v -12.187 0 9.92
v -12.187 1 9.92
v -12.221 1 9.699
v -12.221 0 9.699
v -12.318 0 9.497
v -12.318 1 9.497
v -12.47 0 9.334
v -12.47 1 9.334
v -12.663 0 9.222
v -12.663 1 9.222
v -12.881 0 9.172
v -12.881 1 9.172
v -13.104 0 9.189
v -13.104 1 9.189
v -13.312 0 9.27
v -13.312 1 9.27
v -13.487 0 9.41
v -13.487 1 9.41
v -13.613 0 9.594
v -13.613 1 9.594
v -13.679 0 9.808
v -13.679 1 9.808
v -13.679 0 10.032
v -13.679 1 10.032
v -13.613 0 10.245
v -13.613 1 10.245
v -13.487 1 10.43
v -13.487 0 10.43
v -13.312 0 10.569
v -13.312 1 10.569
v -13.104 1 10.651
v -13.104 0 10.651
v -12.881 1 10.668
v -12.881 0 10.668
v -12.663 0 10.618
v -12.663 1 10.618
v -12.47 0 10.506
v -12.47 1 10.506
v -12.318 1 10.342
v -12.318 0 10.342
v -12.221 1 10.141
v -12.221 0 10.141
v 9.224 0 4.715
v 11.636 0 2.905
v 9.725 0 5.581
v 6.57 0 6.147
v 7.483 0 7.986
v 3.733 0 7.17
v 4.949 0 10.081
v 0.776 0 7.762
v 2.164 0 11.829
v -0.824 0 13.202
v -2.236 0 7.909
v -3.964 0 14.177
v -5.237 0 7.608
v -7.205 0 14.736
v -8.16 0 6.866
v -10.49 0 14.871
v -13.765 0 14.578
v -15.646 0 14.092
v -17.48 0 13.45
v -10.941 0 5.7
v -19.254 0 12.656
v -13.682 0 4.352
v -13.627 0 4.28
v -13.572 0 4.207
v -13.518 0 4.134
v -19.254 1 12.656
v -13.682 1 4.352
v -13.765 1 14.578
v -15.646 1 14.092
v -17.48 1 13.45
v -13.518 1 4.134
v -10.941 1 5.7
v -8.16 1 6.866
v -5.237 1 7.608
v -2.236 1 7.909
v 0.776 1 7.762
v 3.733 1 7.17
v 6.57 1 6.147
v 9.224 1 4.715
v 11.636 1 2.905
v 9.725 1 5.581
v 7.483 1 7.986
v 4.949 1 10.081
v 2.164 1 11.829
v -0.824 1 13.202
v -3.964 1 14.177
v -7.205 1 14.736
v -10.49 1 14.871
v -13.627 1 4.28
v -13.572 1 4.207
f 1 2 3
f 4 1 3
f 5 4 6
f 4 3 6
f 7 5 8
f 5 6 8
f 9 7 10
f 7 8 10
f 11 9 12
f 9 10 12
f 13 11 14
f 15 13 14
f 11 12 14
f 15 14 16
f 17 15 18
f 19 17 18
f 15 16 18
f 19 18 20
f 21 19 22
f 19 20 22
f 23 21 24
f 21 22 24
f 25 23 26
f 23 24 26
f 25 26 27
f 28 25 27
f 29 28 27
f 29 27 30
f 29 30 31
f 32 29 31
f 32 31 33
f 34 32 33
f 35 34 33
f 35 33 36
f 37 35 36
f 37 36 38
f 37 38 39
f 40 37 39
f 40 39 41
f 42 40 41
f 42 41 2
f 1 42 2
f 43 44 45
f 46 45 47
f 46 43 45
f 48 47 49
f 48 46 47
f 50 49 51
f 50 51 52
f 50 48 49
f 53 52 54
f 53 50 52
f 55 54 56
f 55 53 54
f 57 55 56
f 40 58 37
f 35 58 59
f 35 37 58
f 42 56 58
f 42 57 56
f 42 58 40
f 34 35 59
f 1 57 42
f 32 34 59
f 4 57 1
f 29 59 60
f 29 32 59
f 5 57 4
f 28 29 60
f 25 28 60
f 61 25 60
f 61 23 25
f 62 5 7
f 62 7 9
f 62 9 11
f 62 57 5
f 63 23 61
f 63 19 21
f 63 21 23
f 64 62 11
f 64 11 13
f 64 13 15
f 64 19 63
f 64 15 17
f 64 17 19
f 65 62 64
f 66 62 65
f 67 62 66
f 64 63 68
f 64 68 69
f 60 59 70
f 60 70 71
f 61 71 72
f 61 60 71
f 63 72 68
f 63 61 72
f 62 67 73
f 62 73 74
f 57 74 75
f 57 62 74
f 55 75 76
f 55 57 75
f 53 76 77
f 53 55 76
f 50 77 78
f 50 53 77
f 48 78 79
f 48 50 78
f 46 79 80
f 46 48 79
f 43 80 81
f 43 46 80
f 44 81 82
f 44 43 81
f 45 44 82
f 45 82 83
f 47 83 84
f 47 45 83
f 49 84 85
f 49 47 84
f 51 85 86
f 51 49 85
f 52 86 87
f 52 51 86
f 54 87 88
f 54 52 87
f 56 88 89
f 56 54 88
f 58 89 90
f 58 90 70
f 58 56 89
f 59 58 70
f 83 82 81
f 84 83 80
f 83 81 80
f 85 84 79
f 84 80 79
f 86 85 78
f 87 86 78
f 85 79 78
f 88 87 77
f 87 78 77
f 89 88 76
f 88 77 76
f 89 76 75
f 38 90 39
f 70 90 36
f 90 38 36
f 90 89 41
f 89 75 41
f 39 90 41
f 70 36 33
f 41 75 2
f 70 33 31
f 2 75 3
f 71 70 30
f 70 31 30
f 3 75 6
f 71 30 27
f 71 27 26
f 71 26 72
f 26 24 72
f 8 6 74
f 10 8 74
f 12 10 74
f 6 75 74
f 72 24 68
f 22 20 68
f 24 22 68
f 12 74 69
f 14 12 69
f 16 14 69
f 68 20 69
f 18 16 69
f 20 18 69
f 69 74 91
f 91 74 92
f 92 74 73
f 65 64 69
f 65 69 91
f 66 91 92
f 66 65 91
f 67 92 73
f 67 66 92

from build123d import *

# Parameters (mm, degrees)
BOSS_EXTRUDE2_DEPTH = 1
SKETCH6_R           = 0.75
CUT_EXTRUDE3_DEPTH  = 10


with BuildPart() as part:
    # Sketch4 → Boss-Extrude2 (new body)
    with BuildSketch(Plane(origin=(0, 0, 0), x_dir=(1, 0, 0), z_dir=(0, 1, 0))):
        with BuildLine():
            Line((-19.253709209, -12.655761176), (-13.682264454, -4.351605389))
            ThreePointArc((-13.682264454, -4.351605389), (-13.599577219, -4.243463868), (-13.518155162, -4.134366591))
            ThreePointArc((-13.518155162, -4.134366591), (-0.727323966, -7.891124567), (11.63634616, -2.905319296))
            ThreePointArc((11.63634616, -2.905319296), (0.692257999, -12.564498934), (-13.765160625, -14.578416434))
            ThreePointArc((-13.765160625, -14.578416434), (-16.57001445, -13.790023452), (-19.253709209, -12.655761176))
        make_face()
    extrude(amount=BOSS_EXTRUDE2_DEPTH)

    # Sketch6 → Cut-Extrude3 (cut)
    with BuildSketch(Plane(origin=(0, 1, 0), x_dir=(1, 0, 0), z_dir=(0, 1, 0))):
        with Locations((-12.937427019, -9.919909774)):
            Circle(SKETCH6_R)
    extrude(amount=-CUT_EXTRUDE3_DEPTH, mode=Mode.SUBTRACT)


solid = part.part
